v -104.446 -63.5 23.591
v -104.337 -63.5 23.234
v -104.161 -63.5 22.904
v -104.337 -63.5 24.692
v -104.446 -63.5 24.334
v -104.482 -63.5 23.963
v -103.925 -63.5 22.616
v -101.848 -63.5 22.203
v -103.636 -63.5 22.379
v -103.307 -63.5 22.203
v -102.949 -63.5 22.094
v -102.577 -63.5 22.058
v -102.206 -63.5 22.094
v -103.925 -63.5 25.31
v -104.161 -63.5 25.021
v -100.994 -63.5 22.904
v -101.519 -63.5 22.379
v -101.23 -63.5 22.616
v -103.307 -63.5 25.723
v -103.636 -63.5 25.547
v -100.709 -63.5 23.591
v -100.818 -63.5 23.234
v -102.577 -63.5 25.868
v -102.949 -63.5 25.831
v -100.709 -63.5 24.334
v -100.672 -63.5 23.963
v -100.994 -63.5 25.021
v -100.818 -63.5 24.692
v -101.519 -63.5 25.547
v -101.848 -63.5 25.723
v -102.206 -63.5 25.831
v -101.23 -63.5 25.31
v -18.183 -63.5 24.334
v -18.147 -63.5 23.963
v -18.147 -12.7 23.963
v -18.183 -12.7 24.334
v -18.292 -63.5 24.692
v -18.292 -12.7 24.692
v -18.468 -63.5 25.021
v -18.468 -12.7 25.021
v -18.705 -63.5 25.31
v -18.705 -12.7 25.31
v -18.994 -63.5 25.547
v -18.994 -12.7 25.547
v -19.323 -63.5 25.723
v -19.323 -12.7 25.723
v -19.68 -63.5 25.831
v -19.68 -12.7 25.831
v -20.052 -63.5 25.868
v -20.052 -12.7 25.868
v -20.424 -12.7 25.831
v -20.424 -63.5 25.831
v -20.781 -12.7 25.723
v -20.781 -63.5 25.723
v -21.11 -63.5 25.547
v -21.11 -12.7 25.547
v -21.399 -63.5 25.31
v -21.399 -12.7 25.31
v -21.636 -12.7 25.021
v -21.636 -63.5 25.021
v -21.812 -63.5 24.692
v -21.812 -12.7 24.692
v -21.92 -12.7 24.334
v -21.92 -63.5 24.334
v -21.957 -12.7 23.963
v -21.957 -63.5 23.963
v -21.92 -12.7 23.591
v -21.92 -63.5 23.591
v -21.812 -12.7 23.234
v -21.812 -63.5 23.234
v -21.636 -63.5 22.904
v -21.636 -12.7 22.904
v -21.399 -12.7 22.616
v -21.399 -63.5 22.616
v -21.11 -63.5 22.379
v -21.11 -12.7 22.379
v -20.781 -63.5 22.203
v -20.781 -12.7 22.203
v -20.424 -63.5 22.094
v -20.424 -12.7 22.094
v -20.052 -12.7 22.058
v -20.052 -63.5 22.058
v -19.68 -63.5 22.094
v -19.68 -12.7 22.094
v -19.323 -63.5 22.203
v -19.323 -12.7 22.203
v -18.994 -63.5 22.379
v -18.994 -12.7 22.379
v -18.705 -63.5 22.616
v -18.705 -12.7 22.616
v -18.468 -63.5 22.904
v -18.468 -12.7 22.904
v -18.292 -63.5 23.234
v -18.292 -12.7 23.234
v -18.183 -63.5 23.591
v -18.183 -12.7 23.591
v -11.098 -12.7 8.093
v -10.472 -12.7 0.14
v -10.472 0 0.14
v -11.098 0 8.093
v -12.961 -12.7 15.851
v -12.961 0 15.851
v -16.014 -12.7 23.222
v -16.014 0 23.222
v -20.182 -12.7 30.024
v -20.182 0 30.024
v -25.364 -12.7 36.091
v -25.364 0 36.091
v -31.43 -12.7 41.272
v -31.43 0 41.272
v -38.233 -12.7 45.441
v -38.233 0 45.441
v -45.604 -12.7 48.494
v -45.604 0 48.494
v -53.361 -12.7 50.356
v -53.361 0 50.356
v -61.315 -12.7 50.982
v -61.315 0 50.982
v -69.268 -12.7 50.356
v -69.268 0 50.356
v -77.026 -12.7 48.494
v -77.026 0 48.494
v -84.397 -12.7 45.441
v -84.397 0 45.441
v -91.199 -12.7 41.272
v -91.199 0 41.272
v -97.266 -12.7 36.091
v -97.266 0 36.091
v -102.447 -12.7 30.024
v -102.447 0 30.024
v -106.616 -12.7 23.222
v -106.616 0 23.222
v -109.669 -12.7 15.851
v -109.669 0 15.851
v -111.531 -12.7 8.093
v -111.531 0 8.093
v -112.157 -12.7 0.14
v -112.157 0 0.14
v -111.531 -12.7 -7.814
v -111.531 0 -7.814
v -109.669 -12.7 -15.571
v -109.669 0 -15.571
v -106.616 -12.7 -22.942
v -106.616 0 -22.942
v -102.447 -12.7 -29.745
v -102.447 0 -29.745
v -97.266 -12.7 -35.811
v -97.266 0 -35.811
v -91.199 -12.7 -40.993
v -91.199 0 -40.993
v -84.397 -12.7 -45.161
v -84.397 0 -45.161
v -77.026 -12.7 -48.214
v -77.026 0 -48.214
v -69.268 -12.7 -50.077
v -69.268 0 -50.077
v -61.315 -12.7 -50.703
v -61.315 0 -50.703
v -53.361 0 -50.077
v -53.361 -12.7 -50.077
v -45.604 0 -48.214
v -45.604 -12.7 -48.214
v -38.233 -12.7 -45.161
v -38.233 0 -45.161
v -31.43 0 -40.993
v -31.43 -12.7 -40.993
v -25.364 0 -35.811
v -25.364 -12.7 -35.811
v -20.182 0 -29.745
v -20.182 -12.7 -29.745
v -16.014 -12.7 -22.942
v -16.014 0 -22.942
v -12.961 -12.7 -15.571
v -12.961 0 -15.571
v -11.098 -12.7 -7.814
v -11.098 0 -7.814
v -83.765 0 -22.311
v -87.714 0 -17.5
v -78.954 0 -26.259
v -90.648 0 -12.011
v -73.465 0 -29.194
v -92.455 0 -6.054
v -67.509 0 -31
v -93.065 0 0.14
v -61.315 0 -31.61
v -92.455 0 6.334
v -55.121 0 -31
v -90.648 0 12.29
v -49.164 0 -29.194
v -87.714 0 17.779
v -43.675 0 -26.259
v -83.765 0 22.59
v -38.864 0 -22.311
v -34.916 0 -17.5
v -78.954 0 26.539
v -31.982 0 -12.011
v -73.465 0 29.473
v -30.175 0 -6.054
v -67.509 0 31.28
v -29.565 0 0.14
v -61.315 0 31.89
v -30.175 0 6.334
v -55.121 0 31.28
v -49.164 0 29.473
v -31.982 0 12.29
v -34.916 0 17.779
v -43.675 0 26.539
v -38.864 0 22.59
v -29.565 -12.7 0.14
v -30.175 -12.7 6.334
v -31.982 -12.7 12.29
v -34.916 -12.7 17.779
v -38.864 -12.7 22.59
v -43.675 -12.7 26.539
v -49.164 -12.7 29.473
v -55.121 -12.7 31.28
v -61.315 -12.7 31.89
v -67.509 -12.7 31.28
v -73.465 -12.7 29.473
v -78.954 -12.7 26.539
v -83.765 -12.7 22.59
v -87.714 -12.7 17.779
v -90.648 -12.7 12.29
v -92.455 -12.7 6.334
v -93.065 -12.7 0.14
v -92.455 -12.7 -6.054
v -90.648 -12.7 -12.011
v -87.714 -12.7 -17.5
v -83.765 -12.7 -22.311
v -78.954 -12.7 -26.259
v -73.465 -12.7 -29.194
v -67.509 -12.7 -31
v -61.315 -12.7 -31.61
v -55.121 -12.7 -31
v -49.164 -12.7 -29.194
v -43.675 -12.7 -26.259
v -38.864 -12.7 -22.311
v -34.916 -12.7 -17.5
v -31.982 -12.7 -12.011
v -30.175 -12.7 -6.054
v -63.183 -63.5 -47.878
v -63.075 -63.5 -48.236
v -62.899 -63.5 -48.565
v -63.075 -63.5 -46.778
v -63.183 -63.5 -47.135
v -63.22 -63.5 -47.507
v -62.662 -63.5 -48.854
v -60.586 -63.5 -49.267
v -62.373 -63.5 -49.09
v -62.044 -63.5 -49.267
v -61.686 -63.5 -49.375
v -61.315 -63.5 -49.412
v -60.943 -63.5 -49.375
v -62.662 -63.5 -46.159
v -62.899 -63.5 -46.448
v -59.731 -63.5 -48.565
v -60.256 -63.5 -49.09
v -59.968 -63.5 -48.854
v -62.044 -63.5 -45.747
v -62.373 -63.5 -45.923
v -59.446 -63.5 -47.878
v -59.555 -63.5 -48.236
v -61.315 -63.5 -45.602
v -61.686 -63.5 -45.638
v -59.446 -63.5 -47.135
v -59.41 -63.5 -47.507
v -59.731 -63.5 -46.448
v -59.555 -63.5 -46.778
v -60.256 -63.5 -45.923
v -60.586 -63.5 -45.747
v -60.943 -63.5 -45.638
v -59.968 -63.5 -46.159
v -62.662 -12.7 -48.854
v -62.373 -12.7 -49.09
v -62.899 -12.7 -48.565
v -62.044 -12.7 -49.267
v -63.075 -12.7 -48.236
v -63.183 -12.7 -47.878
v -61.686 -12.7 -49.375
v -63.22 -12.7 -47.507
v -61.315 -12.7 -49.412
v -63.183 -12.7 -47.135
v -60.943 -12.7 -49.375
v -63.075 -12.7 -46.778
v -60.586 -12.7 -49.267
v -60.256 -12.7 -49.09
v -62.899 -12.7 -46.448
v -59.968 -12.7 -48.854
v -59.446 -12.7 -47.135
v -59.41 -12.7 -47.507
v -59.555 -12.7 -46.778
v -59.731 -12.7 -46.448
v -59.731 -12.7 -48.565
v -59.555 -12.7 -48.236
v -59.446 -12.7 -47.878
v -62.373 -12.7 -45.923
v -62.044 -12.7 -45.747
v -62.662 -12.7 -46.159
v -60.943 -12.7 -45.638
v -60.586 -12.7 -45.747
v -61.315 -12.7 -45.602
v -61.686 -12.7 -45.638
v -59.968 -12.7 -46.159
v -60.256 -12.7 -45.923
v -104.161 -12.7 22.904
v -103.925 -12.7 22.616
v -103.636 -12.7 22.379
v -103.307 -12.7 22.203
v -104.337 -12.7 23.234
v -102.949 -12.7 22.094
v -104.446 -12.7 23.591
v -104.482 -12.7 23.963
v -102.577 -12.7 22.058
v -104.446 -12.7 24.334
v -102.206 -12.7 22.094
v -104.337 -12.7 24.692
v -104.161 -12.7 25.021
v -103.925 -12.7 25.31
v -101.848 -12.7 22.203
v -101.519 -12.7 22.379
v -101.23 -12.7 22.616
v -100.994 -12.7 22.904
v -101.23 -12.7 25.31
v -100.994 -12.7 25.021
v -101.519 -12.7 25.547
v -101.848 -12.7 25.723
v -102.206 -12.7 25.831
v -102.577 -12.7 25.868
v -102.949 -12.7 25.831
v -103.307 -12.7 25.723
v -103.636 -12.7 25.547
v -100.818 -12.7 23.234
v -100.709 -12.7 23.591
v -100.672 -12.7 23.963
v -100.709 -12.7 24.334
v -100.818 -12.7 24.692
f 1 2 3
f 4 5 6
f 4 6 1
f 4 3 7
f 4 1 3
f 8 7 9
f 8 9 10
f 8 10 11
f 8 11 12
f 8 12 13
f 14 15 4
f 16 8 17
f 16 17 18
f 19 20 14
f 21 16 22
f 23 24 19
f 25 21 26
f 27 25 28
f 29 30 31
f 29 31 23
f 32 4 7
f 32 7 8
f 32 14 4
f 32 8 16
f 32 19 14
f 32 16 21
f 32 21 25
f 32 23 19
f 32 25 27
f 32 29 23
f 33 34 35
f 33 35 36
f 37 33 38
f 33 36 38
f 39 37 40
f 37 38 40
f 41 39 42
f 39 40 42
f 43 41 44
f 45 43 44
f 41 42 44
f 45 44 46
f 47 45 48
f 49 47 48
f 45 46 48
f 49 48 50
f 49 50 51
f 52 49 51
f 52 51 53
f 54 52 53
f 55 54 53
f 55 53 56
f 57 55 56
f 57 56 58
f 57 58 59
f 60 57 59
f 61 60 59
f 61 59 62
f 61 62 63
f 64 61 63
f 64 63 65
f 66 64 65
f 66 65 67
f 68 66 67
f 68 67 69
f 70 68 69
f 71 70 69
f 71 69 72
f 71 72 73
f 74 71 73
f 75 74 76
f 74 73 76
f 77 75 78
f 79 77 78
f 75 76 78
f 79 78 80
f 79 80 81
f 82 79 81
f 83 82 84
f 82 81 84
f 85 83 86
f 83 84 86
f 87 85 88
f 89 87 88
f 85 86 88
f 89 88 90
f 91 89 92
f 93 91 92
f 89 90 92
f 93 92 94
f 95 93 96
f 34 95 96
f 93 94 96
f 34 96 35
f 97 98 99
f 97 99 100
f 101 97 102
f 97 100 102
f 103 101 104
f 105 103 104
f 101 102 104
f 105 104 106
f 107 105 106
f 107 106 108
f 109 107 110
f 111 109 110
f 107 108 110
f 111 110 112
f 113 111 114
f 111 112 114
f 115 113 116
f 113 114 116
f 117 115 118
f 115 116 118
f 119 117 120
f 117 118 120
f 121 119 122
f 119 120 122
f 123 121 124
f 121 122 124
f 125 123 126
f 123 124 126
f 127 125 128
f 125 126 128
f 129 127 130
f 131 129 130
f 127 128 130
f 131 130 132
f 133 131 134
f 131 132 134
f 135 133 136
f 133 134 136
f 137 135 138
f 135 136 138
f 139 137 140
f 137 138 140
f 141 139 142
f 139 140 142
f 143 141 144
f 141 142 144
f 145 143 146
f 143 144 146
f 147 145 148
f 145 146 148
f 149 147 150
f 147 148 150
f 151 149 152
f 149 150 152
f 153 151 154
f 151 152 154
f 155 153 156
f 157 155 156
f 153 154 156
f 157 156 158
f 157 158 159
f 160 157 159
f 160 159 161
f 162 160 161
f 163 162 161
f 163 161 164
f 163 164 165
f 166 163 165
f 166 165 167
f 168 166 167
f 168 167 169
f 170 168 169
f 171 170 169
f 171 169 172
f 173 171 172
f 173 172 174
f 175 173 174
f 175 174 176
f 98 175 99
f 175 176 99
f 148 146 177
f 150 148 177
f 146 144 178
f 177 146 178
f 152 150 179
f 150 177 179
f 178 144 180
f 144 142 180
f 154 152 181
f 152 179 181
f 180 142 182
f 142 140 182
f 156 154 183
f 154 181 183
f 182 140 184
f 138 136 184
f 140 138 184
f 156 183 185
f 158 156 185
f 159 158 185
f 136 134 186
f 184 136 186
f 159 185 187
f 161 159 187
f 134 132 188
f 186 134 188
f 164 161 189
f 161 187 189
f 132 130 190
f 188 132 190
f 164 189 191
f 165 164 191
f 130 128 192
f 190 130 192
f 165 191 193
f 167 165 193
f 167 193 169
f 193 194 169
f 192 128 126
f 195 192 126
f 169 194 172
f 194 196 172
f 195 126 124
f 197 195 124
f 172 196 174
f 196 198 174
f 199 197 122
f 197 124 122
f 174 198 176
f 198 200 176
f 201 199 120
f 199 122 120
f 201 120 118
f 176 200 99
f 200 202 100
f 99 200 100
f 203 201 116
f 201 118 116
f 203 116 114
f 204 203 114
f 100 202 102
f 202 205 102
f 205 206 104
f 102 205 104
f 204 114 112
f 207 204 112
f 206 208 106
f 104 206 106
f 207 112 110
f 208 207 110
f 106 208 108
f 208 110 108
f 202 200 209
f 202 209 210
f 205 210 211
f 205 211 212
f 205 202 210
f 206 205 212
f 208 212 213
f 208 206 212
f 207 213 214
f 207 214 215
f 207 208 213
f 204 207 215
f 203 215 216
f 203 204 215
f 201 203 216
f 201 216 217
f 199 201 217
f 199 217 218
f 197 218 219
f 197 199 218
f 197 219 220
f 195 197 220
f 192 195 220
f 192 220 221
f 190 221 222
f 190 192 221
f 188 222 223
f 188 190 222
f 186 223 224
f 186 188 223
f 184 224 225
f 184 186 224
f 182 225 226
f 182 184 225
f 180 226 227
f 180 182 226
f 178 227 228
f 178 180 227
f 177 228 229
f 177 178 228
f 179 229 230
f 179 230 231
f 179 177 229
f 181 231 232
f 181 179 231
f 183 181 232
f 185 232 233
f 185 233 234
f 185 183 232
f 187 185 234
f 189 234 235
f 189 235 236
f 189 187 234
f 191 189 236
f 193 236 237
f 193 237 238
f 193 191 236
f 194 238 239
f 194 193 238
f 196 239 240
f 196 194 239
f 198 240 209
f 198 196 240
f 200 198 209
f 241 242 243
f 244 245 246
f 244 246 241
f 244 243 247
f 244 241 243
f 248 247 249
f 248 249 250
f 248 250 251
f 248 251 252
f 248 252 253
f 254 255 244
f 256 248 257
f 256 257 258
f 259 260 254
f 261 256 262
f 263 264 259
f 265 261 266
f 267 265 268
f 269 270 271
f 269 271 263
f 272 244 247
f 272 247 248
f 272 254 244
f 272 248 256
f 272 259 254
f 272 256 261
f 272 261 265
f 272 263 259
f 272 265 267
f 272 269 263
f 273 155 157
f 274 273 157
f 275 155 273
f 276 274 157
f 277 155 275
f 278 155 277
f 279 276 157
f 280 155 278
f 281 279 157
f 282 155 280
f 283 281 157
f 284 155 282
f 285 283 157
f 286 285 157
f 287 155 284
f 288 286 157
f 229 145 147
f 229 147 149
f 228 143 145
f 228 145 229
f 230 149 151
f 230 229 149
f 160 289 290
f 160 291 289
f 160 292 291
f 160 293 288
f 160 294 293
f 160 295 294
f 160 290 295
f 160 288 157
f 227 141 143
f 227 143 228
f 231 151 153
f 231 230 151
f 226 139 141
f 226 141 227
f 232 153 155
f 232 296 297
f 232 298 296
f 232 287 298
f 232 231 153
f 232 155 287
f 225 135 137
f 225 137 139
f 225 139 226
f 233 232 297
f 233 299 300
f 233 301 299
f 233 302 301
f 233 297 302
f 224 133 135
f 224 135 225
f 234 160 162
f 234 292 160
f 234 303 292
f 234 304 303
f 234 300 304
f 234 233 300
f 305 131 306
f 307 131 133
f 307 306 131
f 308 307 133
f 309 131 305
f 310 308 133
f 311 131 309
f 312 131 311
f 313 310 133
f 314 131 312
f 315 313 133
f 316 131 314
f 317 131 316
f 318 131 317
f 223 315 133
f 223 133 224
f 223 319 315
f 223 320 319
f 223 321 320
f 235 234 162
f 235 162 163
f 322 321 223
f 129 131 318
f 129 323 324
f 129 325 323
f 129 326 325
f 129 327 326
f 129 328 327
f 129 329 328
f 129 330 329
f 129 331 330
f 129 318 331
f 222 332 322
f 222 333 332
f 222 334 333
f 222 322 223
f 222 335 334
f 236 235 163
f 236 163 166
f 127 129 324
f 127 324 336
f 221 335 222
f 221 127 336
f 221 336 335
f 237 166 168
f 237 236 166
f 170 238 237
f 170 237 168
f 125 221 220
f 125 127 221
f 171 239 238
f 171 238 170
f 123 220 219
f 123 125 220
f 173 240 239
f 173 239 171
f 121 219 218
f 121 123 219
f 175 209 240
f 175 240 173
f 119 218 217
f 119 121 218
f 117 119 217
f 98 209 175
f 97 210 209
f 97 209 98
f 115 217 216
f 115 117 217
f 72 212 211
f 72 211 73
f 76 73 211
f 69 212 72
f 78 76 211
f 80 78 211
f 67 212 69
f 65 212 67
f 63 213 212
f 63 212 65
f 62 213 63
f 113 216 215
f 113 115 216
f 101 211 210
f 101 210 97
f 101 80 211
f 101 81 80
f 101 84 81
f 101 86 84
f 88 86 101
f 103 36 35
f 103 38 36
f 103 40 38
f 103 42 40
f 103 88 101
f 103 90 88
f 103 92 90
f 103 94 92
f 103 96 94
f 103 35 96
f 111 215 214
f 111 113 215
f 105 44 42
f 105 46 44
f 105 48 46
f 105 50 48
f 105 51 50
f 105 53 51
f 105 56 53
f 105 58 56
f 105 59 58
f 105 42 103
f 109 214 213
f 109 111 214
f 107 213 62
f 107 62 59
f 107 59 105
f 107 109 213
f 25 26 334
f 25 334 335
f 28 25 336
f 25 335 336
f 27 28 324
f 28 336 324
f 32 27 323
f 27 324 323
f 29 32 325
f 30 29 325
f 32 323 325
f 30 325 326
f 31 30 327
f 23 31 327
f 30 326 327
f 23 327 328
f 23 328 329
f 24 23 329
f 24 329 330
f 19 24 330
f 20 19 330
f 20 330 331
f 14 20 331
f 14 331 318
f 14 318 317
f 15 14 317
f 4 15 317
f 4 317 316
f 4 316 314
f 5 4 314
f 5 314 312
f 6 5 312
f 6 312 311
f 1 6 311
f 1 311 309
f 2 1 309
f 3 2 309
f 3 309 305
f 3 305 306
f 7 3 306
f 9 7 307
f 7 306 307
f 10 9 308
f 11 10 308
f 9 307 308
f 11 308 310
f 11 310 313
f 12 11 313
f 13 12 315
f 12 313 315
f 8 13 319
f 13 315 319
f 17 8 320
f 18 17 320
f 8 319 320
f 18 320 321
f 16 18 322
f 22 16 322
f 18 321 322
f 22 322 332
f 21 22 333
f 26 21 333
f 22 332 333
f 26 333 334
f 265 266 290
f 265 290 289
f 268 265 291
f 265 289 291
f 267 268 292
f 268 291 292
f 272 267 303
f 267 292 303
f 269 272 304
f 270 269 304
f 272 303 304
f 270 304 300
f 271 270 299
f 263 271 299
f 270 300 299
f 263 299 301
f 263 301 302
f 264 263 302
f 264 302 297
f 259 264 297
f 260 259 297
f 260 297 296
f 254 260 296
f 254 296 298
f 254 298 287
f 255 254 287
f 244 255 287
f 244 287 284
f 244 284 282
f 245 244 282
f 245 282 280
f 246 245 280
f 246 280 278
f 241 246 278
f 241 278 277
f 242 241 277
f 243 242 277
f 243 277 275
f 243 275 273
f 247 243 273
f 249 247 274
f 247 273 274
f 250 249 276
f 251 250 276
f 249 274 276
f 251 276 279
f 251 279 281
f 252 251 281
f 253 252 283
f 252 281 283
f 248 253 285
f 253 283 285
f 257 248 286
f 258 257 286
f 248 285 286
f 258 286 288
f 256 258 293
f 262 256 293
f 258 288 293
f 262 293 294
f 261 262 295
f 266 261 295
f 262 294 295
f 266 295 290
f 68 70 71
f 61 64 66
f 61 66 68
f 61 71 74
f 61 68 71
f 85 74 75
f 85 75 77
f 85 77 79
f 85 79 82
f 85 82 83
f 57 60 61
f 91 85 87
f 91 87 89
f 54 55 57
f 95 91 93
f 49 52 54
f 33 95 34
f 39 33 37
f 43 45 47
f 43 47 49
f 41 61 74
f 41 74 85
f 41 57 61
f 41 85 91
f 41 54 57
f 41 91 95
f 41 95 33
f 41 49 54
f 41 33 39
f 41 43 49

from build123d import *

# Parameters (mm, degrees)
F0_R     = 50.842383
F0_R_2   = 1.905
F0_R_3   = 31.75
F1_DEPTH = 12.7
F2_DEPTH = 63.5


with BuildPart() as f1:
    # F0 (on Front) → F1 (new body)
    with BuildSketch(Plane.XZ):
        with Locations((-61.314686, 0.139674)):
            Circle(F0_R)
        with Locations((-61.314686, -47.506517)):
            Circle(F0_R_2, mode=Mode.SUBTRACT)
        with Locations((-61.314686, 0.139674)):
            Circle(F0_R_3, mode=Mode.SUBTRACT)
        with Locations((-102.577499, 23.96277)):
            Circle(F0_R_2, mode=Mode.SUBTRACT)
        with Locations((-20.051874, 23.96277)):
            Circle(F0_R_2, mode=Mode.SUBTRACT)
    extrude(amount=F1_DEPTH)

    # F0 (on Front) → F2 (join)
    with BuildSketch(Plane.XZ):
        with Locations((-102.577499, 23.96277)):
            Circle(F0_R_2)
        with Locations((-20.051874, 23.96277)):
            Circle(F0_R_2)
        with Locations((-61.314686, -47.506517)):
            Circle(F0_R_2)
    extrude(amount=F2_DEPTH)


solid = f1.part
